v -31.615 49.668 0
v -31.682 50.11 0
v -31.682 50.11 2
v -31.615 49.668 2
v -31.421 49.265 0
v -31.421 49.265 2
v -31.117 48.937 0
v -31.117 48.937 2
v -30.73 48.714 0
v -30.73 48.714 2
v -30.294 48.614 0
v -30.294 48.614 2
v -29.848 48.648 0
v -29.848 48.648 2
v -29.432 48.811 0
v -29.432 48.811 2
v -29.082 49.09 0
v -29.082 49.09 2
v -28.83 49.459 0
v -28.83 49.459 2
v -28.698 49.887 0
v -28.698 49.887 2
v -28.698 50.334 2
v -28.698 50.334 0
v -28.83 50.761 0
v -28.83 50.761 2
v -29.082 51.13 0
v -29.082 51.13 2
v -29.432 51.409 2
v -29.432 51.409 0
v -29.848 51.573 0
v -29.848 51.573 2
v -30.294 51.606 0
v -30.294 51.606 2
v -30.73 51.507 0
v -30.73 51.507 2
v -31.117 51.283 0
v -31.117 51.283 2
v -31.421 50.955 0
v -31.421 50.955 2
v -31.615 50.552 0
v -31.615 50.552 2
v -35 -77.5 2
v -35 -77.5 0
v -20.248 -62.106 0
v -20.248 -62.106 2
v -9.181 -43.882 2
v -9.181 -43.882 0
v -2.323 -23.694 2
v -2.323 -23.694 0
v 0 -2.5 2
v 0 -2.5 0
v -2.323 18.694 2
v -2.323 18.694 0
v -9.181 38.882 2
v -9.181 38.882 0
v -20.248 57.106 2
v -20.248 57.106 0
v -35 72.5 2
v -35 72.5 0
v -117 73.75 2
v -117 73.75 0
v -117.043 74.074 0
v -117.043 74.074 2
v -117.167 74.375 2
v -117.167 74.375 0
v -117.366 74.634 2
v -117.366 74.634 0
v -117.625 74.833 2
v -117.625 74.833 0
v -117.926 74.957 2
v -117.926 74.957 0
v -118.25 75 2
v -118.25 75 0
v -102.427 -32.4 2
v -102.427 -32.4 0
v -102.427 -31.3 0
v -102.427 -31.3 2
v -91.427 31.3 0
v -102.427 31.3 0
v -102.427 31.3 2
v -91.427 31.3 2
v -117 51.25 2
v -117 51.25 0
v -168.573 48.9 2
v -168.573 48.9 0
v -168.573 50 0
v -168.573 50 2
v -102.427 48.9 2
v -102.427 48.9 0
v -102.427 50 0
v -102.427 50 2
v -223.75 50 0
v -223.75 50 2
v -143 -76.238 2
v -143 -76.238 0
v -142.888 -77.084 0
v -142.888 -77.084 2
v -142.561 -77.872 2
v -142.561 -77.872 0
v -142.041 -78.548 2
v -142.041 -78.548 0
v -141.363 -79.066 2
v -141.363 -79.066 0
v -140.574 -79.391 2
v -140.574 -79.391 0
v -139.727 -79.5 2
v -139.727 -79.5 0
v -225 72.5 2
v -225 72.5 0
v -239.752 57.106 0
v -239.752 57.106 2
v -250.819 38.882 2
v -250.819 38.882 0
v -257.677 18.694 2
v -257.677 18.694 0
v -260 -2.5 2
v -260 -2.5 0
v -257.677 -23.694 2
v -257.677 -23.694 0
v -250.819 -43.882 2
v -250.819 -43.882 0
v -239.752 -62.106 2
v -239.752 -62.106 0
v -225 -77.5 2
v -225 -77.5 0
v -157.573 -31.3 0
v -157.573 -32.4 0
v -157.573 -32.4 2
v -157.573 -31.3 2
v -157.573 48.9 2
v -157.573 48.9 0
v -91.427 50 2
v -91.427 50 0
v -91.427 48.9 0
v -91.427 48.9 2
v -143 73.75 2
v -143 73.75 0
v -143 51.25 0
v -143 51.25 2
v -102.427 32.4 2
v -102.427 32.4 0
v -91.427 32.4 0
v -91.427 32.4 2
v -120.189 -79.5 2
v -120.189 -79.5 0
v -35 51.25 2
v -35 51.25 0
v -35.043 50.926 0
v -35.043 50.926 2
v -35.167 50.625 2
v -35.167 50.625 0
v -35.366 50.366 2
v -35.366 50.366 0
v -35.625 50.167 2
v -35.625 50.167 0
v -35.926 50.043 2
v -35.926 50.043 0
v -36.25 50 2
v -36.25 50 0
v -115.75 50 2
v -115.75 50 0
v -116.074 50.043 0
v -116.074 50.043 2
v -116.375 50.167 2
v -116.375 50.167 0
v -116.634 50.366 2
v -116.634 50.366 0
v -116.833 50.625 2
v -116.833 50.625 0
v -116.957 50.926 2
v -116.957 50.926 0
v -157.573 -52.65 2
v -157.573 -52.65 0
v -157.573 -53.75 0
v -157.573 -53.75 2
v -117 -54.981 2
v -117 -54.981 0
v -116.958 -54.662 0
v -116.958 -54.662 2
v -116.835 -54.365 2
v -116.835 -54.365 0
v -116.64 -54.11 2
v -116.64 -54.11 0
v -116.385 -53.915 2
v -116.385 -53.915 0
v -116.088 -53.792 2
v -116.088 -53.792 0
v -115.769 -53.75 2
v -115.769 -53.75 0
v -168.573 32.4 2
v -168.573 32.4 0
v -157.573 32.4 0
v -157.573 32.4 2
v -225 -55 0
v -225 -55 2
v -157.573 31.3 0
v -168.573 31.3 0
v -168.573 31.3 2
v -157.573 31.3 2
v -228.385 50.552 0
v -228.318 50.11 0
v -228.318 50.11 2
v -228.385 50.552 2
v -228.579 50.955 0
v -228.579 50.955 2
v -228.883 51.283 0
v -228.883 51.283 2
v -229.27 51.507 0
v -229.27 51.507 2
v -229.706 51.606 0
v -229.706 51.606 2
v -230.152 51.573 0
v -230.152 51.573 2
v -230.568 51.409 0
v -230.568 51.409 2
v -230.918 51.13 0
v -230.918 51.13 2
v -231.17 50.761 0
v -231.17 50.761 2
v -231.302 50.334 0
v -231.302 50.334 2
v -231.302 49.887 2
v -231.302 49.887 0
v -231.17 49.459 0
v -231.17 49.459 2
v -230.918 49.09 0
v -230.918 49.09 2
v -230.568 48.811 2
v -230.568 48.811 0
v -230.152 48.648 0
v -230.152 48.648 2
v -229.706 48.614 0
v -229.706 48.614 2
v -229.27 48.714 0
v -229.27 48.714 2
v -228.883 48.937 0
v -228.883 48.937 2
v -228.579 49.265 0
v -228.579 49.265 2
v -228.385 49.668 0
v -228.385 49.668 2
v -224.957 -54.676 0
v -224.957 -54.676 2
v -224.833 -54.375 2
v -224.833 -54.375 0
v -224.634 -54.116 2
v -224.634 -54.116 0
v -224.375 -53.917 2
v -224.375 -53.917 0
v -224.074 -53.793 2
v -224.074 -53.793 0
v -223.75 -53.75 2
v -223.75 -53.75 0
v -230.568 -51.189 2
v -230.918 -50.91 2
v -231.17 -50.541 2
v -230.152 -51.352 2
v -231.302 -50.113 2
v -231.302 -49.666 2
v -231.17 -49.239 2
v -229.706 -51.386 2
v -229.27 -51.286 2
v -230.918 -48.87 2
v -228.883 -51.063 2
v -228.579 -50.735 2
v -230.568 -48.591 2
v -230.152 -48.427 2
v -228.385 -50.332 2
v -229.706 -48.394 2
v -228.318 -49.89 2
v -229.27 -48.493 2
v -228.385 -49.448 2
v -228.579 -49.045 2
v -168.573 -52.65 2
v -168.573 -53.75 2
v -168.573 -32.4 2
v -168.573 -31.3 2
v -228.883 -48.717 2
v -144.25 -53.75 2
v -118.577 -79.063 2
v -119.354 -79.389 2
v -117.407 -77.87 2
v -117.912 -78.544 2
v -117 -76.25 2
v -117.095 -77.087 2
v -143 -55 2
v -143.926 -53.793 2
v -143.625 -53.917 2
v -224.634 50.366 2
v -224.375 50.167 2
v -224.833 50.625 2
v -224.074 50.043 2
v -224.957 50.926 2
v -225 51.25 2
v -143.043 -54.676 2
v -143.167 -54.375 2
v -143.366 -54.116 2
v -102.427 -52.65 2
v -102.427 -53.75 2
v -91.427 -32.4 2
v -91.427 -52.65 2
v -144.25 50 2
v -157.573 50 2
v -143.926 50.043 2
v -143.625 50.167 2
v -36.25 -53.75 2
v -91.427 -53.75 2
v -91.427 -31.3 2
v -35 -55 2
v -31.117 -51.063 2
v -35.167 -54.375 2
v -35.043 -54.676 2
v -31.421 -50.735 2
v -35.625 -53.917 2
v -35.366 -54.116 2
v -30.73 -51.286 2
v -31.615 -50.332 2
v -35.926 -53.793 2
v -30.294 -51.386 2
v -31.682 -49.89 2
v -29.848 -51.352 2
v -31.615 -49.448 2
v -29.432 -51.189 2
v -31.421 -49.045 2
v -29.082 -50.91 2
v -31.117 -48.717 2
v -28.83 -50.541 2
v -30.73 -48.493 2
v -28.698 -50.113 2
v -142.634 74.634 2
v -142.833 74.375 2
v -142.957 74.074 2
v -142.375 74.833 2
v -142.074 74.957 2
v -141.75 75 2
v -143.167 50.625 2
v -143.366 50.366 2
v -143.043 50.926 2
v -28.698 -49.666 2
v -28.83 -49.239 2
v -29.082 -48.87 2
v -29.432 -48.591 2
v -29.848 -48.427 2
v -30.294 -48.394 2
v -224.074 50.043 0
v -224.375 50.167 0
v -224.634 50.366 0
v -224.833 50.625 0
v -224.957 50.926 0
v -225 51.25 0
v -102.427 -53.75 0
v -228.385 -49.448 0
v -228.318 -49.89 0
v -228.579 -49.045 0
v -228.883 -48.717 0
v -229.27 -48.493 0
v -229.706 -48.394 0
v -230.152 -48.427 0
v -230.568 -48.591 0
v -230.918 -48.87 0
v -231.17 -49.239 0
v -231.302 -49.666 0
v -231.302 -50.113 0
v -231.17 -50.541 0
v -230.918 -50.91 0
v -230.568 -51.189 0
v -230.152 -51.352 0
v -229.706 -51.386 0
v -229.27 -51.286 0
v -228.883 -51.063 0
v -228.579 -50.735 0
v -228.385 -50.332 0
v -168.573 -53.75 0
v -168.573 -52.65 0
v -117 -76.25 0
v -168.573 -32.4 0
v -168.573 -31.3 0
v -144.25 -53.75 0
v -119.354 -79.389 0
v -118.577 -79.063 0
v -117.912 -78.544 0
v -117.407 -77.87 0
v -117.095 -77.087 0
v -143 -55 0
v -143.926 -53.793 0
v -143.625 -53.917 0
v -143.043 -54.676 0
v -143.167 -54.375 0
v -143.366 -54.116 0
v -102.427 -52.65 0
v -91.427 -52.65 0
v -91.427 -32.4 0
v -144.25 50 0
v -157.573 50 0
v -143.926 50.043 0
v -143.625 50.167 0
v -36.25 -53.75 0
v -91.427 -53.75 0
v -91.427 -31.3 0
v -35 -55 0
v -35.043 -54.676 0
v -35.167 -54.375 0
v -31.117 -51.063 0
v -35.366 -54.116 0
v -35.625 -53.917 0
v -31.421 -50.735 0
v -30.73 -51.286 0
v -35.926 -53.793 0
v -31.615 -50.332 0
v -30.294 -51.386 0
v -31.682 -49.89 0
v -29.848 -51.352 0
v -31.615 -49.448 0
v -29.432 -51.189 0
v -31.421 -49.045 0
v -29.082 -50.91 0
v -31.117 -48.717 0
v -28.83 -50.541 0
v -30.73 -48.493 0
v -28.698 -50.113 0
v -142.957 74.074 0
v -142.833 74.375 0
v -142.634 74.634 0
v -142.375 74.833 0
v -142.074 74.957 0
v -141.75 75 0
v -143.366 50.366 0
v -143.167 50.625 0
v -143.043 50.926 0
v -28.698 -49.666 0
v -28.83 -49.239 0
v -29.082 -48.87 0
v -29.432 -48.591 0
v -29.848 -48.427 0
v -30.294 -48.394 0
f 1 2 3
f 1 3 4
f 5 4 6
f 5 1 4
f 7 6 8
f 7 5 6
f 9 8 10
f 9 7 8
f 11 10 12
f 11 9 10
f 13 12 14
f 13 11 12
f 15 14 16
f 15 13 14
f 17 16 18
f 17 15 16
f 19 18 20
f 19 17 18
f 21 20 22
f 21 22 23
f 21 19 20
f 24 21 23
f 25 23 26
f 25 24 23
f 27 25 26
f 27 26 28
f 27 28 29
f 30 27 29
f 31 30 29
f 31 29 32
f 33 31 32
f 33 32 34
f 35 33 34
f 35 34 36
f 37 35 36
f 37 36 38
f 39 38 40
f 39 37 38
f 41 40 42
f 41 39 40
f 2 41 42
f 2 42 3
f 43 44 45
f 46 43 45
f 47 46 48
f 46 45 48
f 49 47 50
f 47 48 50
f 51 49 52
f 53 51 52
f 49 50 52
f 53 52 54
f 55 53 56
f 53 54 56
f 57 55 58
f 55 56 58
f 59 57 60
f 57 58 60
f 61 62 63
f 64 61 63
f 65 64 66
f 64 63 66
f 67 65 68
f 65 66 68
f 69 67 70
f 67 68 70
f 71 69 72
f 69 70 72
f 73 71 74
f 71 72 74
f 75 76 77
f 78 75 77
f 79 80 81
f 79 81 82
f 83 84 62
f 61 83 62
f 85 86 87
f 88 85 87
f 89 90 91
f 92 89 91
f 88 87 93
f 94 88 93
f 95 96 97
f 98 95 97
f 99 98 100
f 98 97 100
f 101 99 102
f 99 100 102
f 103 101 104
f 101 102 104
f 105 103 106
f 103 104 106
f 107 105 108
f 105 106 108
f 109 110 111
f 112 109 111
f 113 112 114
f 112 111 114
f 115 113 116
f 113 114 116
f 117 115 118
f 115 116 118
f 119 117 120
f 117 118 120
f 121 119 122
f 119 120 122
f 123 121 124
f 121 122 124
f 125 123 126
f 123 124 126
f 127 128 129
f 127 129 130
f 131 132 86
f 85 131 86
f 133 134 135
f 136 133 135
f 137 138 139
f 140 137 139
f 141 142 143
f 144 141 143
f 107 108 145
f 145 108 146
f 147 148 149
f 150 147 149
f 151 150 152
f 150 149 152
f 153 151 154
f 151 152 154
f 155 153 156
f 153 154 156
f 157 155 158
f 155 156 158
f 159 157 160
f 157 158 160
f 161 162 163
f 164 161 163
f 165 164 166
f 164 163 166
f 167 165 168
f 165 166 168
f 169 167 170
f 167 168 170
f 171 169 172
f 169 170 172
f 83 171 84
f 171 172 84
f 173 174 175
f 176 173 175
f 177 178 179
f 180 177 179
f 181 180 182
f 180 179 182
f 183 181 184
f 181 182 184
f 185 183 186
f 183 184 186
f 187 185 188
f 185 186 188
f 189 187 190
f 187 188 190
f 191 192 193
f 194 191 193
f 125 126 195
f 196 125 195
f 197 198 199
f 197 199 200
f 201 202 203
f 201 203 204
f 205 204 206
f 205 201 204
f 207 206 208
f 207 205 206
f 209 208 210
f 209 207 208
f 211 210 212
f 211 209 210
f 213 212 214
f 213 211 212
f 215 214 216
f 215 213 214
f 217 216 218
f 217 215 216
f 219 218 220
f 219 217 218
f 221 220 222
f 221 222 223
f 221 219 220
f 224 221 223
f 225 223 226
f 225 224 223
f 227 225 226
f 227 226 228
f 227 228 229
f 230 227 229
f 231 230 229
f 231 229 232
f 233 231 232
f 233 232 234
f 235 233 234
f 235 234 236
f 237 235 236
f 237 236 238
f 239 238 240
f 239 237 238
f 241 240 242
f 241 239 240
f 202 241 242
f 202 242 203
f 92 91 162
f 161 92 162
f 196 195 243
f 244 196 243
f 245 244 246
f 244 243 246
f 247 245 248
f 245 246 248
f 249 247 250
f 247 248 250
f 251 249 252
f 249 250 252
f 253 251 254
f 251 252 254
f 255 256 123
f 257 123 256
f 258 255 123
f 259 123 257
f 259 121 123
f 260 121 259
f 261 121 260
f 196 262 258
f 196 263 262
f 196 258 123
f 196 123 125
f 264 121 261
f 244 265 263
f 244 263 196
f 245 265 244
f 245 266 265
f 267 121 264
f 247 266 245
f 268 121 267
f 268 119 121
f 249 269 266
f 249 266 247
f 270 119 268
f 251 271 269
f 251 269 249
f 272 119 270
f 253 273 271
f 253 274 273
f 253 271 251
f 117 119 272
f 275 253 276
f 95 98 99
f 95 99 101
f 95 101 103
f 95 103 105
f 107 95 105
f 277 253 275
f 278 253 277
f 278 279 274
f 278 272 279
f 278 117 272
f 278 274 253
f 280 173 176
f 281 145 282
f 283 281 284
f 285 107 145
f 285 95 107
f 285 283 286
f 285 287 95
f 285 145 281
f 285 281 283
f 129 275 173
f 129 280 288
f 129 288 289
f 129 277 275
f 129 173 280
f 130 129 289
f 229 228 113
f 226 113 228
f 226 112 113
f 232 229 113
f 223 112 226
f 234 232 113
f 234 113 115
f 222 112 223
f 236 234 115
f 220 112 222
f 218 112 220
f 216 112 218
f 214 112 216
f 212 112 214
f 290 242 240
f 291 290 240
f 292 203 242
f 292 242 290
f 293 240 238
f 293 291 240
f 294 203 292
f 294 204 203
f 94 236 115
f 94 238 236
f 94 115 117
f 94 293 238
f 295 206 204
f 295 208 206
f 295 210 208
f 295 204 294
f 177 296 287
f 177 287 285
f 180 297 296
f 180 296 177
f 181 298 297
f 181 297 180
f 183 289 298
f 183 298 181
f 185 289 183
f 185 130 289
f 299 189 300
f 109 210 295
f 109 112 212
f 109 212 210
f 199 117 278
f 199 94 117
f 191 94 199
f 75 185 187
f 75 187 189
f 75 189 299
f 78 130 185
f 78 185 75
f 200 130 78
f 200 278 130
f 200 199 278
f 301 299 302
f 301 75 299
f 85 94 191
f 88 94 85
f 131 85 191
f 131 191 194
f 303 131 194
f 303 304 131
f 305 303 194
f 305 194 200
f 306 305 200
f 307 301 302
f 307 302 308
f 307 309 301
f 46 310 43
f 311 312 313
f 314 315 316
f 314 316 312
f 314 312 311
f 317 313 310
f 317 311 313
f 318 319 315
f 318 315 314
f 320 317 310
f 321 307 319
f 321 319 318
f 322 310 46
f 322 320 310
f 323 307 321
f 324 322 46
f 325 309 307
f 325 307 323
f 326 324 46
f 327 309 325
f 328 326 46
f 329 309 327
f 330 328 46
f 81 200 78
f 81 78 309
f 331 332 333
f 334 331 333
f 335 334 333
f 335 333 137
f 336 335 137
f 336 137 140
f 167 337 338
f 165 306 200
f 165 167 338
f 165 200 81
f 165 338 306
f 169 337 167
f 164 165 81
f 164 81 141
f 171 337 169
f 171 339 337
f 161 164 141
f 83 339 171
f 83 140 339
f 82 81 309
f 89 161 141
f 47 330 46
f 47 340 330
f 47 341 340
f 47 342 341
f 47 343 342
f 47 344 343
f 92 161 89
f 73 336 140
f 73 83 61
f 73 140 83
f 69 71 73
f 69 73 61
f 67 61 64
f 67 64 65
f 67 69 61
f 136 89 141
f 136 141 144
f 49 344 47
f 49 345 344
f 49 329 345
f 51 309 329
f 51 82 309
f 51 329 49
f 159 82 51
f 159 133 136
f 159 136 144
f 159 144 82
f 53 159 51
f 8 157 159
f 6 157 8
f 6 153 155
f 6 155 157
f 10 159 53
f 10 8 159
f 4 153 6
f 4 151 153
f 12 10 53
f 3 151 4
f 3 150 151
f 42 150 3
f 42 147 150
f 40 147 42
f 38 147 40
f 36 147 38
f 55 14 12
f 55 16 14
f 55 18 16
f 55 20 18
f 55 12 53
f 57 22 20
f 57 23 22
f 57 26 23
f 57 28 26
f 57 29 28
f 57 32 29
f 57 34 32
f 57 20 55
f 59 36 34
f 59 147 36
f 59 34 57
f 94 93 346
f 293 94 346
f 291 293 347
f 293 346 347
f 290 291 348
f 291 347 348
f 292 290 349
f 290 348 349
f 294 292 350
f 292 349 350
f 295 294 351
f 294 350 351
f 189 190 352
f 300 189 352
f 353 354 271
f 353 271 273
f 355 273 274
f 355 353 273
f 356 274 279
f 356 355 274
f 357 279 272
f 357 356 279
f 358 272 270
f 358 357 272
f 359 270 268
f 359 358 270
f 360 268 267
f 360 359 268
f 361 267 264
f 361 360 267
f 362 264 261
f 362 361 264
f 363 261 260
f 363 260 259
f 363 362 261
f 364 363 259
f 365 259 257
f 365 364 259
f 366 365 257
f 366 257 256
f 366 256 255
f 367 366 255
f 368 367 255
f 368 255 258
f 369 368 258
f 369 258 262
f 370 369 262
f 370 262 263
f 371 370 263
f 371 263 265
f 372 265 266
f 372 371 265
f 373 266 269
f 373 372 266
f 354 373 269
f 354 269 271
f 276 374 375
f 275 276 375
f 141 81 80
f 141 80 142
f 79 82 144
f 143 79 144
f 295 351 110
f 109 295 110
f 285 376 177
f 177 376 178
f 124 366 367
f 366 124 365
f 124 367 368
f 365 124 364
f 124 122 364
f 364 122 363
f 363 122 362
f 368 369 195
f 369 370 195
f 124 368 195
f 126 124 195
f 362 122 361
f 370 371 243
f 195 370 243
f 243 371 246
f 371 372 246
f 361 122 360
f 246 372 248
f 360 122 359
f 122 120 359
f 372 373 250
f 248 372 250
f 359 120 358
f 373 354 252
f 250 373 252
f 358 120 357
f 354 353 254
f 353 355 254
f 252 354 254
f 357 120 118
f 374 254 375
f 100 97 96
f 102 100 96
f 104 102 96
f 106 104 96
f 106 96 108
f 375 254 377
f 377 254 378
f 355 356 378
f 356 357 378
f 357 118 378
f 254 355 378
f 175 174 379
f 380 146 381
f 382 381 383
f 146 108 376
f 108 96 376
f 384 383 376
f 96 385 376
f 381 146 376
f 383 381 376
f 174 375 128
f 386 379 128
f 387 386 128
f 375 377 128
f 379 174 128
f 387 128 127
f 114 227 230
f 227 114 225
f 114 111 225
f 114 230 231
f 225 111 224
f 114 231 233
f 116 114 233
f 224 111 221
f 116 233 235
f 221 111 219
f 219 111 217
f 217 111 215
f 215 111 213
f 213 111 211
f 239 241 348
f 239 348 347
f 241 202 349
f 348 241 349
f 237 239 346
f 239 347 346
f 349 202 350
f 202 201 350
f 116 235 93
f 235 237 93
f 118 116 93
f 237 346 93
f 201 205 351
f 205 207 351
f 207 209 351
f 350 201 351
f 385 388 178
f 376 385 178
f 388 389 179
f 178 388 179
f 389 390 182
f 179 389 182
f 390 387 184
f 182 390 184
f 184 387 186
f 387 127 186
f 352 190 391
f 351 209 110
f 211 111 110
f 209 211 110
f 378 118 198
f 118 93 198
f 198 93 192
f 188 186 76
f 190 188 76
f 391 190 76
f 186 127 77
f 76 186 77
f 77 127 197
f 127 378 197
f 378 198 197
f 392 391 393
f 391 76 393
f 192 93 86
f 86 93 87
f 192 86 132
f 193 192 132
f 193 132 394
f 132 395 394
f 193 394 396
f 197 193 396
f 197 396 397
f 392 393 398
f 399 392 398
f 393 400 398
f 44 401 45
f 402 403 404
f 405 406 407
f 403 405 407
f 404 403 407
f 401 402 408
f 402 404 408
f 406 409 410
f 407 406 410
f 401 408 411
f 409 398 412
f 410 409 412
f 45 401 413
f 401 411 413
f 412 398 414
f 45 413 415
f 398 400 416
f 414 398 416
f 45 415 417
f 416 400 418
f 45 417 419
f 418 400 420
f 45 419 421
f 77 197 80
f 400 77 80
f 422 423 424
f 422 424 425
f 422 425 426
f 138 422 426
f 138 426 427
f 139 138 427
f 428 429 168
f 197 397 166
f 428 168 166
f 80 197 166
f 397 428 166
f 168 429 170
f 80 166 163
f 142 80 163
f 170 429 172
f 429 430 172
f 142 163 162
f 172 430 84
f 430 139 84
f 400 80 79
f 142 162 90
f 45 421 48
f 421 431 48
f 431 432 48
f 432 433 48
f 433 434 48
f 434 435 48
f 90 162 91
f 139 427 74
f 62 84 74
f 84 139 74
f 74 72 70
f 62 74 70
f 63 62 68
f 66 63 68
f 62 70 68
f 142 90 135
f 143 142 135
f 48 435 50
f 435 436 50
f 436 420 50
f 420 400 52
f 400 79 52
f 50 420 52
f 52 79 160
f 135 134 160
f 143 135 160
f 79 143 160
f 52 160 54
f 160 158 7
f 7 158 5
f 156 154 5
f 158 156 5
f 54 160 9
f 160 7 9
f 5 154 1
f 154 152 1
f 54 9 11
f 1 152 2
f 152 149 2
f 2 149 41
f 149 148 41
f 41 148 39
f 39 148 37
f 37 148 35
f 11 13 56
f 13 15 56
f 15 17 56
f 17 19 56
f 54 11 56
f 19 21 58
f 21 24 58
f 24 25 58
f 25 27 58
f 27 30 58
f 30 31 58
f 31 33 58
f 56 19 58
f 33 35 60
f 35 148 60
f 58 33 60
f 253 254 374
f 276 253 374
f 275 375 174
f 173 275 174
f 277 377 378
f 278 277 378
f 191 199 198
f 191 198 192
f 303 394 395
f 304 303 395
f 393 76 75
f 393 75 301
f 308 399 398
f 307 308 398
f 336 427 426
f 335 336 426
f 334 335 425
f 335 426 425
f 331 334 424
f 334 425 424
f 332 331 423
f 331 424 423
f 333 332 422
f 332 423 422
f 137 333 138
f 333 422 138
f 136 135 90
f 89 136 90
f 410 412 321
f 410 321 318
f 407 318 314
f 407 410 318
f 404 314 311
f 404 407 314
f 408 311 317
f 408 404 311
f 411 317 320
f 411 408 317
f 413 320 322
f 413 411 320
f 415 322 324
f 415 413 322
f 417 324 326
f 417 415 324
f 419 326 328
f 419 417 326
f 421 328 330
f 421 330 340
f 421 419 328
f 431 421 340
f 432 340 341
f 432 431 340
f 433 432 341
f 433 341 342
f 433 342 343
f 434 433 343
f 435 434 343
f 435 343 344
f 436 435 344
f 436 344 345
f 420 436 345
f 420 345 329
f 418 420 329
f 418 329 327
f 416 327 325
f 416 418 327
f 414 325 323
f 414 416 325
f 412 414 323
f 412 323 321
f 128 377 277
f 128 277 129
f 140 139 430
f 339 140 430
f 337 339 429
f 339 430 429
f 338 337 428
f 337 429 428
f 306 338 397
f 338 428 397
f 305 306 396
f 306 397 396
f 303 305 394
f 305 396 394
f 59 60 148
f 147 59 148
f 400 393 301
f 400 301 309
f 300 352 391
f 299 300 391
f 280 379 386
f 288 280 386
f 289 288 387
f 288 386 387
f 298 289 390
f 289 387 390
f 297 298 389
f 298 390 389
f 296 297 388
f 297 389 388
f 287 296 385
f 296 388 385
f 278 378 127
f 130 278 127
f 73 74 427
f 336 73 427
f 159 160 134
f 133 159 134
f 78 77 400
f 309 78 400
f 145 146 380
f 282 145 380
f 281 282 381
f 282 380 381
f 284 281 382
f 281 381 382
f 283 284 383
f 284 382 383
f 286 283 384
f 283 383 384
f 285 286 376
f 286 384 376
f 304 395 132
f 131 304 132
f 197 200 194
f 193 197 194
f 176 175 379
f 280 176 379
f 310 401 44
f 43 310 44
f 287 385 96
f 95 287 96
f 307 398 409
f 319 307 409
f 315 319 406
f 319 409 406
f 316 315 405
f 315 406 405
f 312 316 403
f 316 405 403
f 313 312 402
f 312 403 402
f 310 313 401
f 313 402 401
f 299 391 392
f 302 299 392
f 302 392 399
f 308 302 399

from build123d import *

# Parameters (mm, degrees)
SZKIC1_R                    = 1.5
SZKIC1_W                    = 11
SZKIC1_H                    = 1.1
DODANIE_WYCI_GNI_CIE3_DEPTH = 2


with BuildPart() as part:
    # Szkic1 → Dodanie-wyciągnięcie3 (new body)
    with BuildSketch(Plane.XY):
        with BuildLine():
            Line((-139.727293062, -79.5), (-120.189002398, -79.5))
            ThreePointArc((-120.189002398, -79.5), (-117.912369122, -78.544329486), (-117, -76.25))
            Line((-117, -76.25), (-117, -54.98069498))
            ThreePointArc((-117, -54.98069498), (-116.639537786, -54.110462214), (-115.76930502, -53.75))
            Line((-115.76930502, -53.75), (-102.427025017, -53.75))
            Line((-102.427025017, -53.75), (-102.427025017, -52.65))
            Line((-102.427025017, -52.65), (-91.427025017, -52.65))
            Line((-91.427025017, -52.65), (-91.427025017, -53.75))
            Line((-91.427025017, -53.75), (-87.218924948, -53.75))
            Line((-87.218924948, -53.75), (-36.25, -53.75))
            ThreePointArc((-36.25, -53.75), (-35.366116524, -54.116116524), (-35, -55))
            Line((-35, -55), (-35, -77.5))
            ThreePointArc((-35, -77.5), (0, -2.5), (-35, 72.5))
            Line((-35, 72.5), (-35, 51.25))
            ThreePointArc((-35, 51.25), (-35.366116524, 50.366116524), (-36.25, 50))
            Line((-36.25, 50), (-91.427025017, 50))
            Line((-91.427025017, 50), (-91.427025017, 48.9))
            Line((-91.427025017, 48.9), (-102.427025017, 48.9))
            Line((-102.427025017, 48.9), (-102.427025017, 50))
            Line((-102.427025017, 50), (-115.75, 50))
            ThreePointArc((-115.75, 50), (-116.633883476, 50.366116524), (-117, 51.25))
            Line((-117, 51.25), (-117, 73.75))
            ThreePointArc((-117, 73.75), (-117.366116524, 74.633883476), (-118.25, 75))
            Line((-118.25, 75), (-141.75, 75))
            ThreePointArc((-141.75, 75), (-142.633883476, 74.633883476), (-143, 73.75))
            Line((-143, 73.75), (-143, 51.25))
            ThreePointArc((-143, 51.25), (-143.366116524, 50.366116524), (-144.25, 50))
            Line((-144.25, 50), (-157.572974983, 50))
            Line((-157.572974983, 50), (-157.572974983, 48.9))
            Line((-157.572974983, 48.9), (-168.572974983, 48.9))
            Line((-168.572974983, 48.9), (-168.572974983, 50))
            Line((-168.572974983, 50), (-223.75, 50))
            ThreePointArc((-223.75, 50), (-224.633883476, 50.366116524), (-225, 51.25))
            Line((-225, 51.25), (-225, 72.5))
            ThreePointArc((-225, 72.5), (-260, -2.5), (-225, -77.5))
            Line((-225, -77.5), (-225, -55))
            ThreePointArc((-225, -55), (-224.633883476, -54.116116524), (-223.75, -53.75))
            Line((-223.75, -53.75), (-172.781075052, -53.75))
            Line((-172.781075052, -53.75), (-168.572974983, -53.75))
            Line((-168.572974983, -53.75), (-168.572974983, -52.65))
            Line((-168.572974983, -52.65), (-166.090308712, -52.65))
            Line((-166.090308712, -52.65), (-157.572974983, -52.65))
            Line((-157.572974983, -52.65), (-157.572974983, -53.75))
            Line((-157.572974983, -53.75), (-144.25, -53.75))
            ThreePointArc((-144.25, -53.75), (-143.366116524, -54.116116524), (-143, -55))
            Line((-143, -55), (-143, -76.237644119))
            ThreePointArc((-143, -76.237644119), (-142.040816528, -78.548140635), (-139.727293062, -79.5))
        make_face()
        with Locations((-229.818345238, 50.110219647)):
            Circle(SZKIC1_R, mode=Mode.SUBTRACT)
        with Locations((-229.818345238, -49.889780353)):
            Circle(SZKIC1_R, mode=Mode.SUBTRACT)
        with Locations(Location((-30.181654762, -49.889780353, 0), (0, 0, 180))):
            Circle(SZKIC1_R, mode=Mode.SUBTRACT)
        with Locations(Location((-30.181654762, 50.110219647, 0), (0, 0, 180))):
            Circle(SZKIC1_R, mode=Mode.SUBTRACT)
        with Locations((-163.072974983, -31.85)):
            Rectangle(SZKIC1_W, SZKIC1_H, mode=Mode.SUBTRACT)
        with Locations((-163.072974983, 31.85)):
            Rectangle(SZKIC1_W, SZKIC1_H, mode=Mode.SUBTRACT)
        with Locations((-96.927025017, 31.85)):
            Rectangle(SZKIC1_W, SZKIC1_H, mode=Mode.SUBTRACT)
        with Locations((-96.927025017, -31.85)):
            Rectangle(SZKIC1_W, SZKIC1_H, mode=Mode.SUBTRACT)
    extrude(amount=DODANIE_WYCI_GNI_CIE3_DEPTH)


solid = part.part
